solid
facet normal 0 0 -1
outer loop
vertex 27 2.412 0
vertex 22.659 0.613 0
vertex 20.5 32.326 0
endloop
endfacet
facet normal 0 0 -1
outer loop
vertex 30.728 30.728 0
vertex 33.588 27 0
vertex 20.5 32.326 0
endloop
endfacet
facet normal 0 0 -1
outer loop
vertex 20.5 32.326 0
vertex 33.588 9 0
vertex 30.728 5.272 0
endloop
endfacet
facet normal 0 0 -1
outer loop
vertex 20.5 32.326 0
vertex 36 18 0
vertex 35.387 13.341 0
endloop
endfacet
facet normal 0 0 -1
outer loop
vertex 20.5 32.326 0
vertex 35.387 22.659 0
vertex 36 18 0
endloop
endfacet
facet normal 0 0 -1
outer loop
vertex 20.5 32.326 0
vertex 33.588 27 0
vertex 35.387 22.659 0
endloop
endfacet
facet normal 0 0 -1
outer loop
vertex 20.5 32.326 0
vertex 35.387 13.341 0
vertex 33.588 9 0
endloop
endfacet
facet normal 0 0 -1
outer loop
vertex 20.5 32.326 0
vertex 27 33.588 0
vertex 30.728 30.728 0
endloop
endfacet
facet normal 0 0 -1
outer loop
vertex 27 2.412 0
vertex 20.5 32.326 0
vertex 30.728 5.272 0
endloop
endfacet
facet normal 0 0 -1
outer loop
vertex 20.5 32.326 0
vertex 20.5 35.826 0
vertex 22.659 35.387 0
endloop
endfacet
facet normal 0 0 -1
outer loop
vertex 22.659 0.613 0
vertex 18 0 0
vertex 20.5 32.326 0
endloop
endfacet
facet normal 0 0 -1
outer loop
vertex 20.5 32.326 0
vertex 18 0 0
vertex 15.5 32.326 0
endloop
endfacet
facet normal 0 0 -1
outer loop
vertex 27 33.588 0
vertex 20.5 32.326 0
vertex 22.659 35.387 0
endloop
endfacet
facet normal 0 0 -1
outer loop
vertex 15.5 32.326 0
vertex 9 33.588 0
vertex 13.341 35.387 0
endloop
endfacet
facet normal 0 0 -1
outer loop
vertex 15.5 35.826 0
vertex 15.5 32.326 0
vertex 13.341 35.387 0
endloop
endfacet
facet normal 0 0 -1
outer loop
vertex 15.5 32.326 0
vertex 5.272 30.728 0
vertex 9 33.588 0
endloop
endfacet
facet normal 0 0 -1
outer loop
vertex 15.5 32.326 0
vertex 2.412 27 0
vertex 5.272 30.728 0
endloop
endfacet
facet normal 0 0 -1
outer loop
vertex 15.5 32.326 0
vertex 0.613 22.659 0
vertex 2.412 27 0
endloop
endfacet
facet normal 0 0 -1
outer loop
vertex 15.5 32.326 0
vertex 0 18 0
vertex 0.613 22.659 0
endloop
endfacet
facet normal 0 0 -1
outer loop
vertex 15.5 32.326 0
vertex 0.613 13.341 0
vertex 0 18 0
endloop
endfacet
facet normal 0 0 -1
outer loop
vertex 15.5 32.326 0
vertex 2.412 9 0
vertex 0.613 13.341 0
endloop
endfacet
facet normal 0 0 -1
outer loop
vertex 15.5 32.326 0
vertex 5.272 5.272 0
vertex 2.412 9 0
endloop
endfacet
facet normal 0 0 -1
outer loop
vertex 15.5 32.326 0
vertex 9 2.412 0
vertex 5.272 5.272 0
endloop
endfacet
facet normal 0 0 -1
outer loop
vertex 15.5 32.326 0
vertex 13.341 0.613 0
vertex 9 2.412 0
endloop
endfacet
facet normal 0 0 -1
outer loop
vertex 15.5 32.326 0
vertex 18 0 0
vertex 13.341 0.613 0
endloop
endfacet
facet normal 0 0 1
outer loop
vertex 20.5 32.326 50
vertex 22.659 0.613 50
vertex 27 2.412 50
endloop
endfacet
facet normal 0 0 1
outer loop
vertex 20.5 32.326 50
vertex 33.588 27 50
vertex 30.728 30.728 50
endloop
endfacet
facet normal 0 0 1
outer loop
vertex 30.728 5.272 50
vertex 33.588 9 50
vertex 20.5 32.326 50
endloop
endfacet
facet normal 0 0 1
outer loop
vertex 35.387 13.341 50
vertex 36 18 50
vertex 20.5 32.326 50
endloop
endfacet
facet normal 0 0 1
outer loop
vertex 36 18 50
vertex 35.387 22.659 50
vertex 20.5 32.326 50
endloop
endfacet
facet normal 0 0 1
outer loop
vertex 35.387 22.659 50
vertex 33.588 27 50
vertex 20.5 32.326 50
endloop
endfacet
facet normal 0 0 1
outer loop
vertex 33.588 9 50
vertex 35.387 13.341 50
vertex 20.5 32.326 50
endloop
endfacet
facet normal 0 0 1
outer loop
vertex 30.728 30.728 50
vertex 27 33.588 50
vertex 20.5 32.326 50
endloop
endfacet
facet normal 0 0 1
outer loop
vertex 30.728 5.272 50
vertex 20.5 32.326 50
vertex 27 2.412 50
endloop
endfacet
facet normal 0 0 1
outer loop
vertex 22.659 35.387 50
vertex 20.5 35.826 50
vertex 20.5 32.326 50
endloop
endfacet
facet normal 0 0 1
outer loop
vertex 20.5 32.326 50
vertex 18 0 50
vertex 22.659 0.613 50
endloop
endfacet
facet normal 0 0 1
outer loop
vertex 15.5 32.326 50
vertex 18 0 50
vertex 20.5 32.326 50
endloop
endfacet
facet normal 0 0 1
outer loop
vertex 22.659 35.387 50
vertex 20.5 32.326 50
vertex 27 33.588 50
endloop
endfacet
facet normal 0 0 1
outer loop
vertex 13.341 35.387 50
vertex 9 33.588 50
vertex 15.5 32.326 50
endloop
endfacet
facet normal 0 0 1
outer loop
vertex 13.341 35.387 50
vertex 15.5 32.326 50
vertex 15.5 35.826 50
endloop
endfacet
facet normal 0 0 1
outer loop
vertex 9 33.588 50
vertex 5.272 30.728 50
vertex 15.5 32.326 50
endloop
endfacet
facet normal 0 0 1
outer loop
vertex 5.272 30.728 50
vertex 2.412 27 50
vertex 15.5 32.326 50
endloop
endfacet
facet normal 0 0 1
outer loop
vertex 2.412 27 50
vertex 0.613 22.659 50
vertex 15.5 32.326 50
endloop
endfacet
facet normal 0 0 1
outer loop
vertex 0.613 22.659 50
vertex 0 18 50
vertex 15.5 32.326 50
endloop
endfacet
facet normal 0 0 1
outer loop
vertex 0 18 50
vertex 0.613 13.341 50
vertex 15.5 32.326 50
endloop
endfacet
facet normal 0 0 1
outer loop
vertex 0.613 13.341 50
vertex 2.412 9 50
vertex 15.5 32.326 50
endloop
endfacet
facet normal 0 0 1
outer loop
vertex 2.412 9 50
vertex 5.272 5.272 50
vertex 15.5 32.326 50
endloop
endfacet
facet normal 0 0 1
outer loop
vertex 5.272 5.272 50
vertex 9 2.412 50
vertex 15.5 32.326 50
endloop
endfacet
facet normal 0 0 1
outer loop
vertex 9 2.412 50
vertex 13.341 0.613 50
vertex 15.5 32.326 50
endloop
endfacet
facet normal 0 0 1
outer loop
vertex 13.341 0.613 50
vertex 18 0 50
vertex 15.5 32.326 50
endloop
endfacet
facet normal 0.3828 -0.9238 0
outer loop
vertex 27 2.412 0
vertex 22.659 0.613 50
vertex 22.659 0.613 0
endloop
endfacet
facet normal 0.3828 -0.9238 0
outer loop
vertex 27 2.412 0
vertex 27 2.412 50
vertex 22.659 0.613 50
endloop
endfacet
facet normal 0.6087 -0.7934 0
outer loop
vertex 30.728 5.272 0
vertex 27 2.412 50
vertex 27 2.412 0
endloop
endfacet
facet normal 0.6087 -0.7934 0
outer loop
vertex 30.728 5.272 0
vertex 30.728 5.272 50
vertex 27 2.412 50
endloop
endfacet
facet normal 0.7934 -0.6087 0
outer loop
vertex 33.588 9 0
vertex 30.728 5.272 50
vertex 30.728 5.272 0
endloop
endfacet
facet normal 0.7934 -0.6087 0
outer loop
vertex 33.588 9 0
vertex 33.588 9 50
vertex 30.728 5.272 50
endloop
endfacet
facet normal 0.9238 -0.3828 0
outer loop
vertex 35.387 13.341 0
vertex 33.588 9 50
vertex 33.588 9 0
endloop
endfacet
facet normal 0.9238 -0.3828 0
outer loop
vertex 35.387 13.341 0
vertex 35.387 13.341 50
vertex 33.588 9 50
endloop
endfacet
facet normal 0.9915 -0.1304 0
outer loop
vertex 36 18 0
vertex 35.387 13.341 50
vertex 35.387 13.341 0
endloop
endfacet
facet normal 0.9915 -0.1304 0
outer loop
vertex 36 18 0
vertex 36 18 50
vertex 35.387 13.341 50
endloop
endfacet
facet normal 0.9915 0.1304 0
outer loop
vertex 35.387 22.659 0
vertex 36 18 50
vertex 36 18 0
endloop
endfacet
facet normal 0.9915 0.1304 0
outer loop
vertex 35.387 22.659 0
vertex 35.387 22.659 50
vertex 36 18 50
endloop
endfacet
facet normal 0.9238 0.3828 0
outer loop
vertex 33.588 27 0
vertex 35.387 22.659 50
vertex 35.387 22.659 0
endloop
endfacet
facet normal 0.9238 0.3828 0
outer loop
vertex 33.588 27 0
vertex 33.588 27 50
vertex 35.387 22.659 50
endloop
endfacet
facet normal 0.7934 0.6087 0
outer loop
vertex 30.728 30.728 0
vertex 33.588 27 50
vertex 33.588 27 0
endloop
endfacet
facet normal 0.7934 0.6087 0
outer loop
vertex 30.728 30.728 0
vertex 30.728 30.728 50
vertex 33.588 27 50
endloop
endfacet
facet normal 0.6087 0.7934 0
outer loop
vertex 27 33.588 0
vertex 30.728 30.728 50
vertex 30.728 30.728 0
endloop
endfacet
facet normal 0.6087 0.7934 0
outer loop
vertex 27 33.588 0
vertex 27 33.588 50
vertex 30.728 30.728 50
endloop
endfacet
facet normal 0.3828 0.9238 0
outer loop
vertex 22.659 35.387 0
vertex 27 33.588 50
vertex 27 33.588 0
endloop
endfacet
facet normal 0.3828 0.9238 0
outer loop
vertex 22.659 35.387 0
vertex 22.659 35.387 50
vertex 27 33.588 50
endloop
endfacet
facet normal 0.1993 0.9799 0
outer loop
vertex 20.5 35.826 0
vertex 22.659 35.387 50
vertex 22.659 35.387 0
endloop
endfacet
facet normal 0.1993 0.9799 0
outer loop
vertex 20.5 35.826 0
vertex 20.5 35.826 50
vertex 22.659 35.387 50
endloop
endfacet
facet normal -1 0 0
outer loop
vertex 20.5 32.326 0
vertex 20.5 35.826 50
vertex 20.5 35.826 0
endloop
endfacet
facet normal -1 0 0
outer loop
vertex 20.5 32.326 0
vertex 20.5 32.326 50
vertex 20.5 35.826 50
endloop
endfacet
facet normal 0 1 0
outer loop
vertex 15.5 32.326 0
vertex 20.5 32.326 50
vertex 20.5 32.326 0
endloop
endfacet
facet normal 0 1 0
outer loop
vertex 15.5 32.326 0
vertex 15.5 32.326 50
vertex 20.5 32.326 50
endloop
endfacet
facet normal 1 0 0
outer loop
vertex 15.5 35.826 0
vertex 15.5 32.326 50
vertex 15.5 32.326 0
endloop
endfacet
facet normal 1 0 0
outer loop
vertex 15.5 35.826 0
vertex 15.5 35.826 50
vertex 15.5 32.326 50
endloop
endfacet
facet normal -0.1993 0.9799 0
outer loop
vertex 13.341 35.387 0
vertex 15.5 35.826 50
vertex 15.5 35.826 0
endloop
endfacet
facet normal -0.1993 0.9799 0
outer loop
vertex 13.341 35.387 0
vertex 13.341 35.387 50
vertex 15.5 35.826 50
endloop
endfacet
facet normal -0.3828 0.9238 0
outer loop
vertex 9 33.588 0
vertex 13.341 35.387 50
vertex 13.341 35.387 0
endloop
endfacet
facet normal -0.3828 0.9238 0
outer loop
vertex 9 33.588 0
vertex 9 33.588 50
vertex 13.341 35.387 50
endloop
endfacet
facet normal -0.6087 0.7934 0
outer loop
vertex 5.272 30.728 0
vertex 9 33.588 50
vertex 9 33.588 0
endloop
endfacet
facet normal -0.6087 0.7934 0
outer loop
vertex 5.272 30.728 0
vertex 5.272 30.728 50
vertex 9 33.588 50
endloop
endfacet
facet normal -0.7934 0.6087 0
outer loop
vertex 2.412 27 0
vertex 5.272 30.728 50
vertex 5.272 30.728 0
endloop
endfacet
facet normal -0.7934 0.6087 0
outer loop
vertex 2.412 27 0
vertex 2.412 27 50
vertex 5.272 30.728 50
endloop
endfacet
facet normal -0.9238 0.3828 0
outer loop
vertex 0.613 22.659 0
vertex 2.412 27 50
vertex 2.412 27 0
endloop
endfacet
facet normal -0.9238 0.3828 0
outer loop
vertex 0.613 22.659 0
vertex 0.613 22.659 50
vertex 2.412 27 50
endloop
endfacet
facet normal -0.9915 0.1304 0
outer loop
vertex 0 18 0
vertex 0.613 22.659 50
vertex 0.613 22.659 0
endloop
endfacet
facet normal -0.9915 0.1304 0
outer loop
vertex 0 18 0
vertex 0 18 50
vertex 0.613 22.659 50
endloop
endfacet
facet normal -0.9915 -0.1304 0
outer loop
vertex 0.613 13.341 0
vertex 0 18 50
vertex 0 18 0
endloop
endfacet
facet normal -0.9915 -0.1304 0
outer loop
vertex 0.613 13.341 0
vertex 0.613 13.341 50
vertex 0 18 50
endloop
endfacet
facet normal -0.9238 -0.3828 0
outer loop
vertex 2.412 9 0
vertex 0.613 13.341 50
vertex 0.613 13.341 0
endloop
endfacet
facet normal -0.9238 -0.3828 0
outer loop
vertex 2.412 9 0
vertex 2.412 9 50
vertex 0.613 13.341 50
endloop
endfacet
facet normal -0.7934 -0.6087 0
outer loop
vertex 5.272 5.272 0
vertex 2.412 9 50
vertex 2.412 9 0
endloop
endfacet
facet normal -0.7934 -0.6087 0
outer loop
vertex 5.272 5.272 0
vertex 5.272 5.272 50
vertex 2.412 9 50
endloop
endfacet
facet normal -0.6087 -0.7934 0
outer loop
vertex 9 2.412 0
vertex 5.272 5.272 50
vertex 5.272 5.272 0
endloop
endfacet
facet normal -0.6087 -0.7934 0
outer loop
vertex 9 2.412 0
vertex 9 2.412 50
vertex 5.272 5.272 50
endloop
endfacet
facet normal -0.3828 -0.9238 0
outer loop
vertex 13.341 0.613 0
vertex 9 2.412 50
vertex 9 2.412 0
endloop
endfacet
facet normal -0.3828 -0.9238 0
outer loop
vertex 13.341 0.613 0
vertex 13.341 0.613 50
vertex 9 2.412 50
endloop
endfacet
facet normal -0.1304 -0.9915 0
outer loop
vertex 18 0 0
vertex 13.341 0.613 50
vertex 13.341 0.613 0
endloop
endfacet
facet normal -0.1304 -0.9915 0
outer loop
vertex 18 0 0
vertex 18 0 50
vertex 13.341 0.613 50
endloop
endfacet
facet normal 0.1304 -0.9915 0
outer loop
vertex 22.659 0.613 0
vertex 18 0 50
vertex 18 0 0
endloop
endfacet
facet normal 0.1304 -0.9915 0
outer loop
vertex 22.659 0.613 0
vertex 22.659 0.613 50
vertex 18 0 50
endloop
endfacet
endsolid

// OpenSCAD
$fn = 32;

// ----------------------------------------------------------------------
// Keyway shaft: d36 shaft, key 5 x 3.5 mm
// ----------------------------------------------------------------------

// --- parameters (mm) ---
shaft_r = 18;             // shaft radius
key_w = 5;                // keyway width
key_d = 3.5;              // keyway depth below the surface line
plate_t = 50;             // shaft length, Z (extrusion height)

shaft_d = 2 * shaft_r;  // shaft diameter
circle_step = 15;  // polygon sampling step, degrees

profile = [[13.341, 35.387], [9, 33.588], [5.272, 30.728], [2.412, 27], [0.613, 22.659], [0, 18], [0.613, 13.341], [2.412, 9], [5.272, 5.272], [9, 2.412], [13.341, 0.613], [18, 0], [22.659, 0.613], [27, 2.412], [30.728, 5.272], [33.588, 9], [35.387, 13.341], [36, 18], [35.387, 22.659], [33.588, 27], [30.728, 30.728], [27, 33.588], [22.659, 35.387], [20.5, 35.826], [20.5, 32.326], [15.5, 32.326], [15.5, 35.826]];  // primary outline, 27 points, counter clockwise

// --- the one profile operation ---
linear_extrude(height = plate_t) polygon(points = profile);
